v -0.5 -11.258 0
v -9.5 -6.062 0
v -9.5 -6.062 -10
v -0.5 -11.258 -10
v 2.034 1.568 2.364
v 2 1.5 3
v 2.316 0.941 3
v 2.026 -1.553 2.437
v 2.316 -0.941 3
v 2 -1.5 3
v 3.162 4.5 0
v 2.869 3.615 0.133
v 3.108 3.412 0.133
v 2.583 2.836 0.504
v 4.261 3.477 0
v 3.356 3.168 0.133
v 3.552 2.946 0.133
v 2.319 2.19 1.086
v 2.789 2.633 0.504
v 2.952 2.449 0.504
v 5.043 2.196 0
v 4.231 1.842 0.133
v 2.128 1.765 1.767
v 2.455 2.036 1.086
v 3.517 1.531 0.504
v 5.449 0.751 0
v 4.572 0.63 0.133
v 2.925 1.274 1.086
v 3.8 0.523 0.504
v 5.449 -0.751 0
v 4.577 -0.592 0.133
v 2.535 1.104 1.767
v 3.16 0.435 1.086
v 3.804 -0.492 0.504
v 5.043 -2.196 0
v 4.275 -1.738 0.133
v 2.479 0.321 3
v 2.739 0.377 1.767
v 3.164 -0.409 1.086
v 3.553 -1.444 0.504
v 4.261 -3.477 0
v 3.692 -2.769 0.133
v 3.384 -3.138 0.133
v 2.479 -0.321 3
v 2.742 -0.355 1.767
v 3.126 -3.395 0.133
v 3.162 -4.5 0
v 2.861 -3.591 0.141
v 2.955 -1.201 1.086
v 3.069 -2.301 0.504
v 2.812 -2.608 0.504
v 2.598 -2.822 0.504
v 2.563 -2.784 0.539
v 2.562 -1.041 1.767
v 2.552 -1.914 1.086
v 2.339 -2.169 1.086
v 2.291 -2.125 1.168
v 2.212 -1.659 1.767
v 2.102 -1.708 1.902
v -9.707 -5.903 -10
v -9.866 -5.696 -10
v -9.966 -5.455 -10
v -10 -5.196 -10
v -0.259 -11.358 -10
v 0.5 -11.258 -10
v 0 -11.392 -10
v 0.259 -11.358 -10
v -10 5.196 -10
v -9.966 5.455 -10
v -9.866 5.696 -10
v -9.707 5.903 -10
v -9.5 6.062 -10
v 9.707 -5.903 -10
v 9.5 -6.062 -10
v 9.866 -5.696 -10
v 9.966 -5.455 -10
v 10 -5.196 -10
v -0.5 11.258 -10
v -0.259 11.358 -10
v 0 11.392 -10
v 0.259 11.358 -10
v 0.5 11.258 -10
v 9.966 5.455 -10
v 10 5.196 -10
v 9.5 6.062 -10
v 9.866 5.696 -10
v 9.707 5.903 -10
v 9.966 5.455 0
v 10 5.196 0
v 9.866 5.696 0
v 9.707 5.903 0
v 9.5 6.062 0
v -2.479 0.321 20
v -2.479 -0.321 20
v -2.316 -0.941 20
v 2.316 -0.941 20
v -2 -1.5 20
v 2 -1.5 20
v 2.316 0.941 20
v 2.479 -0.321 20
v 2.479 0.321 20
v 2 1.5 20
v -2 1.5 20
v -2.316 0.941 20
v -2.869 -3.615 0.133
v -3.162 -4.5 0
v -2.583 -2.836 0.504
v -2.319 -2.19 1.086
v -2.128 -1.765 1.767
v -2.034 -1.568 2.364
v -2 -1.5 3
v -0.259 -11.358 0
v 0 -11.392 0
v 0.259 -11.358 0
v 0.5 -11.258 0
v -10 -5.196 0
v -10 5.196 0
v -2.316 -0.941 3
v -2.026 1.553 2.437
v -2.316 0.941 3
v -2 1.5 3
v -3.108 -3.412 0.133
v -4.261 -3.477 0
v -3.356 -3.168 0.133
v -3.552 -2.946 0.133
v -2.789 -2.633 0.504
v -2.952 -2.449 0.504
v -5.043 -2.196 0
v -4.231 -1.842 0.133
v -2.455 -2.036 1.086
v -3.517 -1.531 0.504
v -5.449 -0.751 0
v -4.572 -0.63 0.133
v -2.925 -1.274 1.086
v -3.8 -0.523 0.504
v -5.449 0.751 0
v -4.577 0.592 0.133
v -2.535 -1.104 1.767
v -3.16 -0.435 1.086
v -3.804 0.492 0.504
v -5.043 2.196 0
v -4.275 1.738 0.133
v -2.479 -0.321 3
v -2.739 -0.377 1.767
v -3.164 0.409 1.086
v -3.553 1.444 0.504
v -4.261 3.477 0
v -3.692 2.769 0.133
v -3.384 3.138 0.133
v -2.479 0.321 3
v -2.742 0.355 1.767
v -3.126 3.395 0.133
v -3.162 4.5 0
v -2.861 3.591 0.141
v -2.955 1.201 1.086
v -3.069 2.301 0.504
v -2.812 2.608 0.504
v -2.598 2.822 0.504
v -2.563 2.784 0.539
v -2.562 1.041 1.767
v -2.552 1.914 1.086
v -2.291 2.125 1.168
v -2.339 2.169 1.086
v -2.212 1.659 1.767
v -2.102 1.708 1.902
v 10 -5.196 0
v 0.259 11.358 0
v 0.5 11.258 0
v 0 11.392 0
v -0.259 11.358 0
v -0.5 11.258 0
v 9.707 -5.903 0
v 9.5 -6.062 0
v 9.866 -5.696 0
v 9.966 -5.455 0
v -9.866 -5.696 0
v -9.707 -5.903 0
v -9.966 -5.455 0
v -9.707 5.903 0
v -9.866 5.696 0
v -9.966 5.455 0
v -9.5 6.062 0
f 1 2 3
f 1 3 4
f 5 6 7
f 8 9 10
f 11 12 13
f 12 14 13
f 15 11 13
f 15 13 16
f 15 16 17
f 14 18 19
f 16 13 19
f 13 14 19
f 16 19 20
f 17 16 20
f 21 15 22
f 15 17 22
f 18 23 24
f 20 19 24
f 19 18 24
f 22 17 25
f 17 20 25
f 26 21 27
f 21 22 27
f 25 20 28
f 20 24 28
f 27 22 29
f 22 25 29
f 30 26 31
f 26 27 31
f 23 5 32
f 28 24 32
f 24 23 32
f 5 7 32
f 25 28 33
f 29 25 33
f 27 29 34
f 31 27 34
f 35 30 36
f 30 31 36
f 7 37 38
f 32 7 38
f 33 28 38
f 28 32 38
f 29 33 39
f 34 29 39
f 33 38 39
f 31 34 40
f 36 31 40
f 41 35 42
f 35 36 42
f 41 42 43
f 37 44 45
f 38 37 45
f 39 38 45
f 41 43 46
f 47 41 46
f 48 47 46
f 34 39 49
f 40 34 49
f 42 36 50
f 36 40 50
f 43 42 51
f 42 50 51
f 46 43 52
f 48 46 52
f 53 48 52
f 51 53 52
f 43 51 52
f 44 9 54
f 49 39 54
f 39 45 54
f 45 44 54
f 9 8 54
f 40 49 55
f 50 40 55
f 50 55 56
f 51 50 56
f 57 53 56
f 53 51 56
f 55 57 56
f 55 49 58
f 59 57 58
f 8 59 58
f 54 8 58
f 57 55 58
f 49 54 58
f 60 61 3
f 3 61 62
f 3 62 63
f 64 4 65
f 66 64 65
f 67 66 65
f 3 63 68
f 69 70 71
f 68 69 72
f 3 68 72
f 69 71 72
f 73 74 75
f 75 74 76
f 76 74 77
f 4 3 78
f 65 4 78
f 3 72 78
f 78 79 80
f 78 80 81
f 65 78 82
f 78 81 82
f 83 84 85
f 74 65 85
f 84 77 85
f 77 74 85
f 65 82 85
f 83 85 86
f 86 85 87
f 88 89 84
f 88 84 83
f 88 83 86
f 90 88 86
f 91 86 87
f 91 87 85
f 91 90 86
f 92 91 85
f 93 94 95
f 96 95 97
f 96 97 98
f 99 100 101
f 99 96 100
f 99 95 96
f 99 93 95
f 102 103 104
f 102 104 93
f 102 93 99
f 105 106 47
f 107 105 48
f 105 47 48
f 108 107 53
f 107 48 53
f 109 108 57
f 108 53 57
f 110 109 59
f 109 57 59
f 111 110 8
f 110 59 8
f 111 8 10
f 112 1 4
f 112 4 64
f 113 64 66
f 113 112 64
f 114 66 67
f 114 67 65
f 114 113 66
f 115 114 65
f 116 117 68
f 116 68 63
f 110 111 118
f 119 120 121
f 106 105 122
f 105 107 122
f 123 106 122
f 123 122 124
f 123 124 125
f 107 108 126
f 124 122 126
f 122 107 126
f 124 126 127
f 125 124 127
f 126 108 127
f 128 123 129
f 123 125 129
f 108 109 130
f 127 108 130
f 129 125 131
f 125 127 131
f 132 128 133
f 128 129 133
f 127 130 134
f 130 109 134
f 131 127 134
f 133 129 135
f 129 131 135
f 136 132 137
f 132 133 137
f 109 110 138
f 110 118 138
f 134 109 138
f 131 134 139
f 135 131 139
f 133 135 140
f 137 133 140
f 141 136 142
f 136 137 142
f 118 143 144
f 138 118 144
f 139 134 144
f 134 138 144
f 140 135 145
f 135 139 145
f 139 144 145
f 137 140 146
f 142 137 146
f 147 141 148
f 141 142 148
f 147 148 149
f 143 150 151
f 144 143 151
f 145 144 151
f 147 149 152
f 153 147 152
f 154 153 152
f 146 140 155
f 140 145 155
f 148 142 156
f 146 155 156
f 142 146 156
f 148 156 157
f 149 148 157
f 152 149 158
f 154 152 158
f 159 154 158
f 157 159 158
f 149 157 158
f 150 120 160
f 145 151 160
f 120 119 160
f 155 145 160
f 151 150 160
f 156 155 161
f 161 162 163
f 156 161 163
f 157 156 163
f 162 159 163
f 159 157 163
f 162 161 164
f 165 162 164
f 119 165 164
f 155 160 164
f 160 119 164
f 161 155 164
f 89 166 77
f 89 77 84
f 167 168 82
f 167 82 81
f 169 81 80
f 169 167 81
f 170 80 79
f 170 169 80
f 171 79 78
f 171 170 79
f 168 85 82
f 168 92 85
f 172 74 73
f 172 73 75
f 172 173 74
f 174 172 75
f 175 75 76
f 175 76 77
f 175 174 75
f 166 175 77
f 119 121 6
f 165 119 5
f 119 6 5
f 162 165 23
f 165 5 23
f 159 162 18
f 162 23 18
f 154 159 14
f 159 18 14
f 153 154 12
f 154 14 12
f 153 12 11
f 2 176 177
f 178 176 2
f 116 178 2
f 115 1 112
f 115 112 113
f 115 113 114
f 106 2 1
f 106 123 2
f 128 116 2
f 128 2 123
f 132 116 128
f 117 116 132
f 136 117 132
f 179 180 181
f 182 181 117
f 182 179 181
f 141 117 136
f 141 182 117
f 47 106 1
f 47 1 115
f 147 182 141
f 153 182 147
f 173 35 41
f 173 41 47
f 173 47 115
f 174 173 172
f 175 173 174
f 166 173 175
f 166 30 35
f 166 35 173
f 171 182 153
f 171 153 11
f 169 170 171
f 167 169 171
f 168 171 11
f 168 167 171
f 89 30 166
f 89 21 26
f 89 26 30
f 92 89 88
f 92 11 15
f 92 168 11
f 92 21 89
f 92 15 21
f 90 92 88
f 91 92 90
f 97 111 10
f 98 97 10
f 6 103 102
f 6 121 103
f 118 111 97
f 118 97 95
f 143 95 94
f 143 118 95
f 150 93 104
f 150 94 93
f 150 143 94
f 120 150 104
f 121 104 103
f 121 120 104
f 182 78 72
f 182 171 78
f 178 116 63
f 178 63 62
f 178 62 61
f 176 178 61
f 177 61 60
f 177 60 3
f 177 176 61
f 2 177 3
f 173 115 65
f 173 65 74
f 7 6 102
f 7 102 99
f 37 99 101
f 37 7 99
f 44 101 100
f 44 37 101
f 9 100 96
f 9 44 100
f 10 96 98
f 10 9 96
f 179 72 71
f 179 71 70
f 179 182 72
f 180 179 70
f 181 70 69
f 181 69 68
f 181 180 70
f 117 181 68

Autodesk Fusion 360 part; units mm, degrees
sketch "Boceto1" plane through (0, 0, 0) normal (0, 0, 1) x (1, 0, 0)
  circle A0 centre (0, 0) radius 2.5
  line L0 (9.5, 6.0622) -> (0.5, 11.2583)
  line L1 (-0.5, 11.2583) -> (-9.5, 6.0622)
  line L2 (-10, 5.1962) -> (-10, -5.1962)
  line L3 (-9.5, -6.0622) -> (-0.5, -11.2583)
  line L4 (0.5, -11.2583) -> (9.5, -6.0622)
  line L5 (10, -5.1962) -> (10, 5.1962)
  line L6 (-2, 1.5) -> (2, 1.5)
  line L7 (-2, -1.5) -> (2, -1.5)
  arc A1 (-9.5, 6.0622) -> (-10, 5.1962) centre (-9, 5.1962) ccw
  arc A2 (0.5, 11.2583) -> (-0.5, 11.2583) centre (0, 10.3923) ccw
  arc A3 (10, 5.1962) -> (9.5, 6.0622) centre (9, 5.1962) ccw
  arc A4 (9.5, -6.0622) -> (10, -5.1962) centre (9, -5.1962) ccw
  arc A5 (-0.5, -11.2583) -> (0.5, -11.2583) centre (0, -10.3923) ccw
  arc A6 (-10, -5.1962) -> (-9.5, -6.0622) centre (-9, -5.1962) ccw
  dimension "d1" = 3
  dimension "d2" = 1.5
  dimension "d3" = 5
  dimension "d4" = 20
  dimension "d11" = 1
  dimension "d12" = 10
  dimension "d13" = 10
  dimension "d14" = 10
extrude "Extruir1" add sketch "Boceto1" along normal blind 20 contours A0 L6 L7
extrude "Extruir2" add sketch "Boceto1" against normal blind 10 contours A0 L6 L7 | A0 L6 | A0 L7 | L0 L1 L2 L3 L4 L5 A1 A2 A3 A4 A5 A6
fillet "Empalme1" radius 3 4 edges at (2.5, 0, 0) (0, -1.5, 0) (0, 1.5, 0) (-2.5, 0, 0)
equation "d2 = d1 / 2"
equation "d12 = d4 / 2"
